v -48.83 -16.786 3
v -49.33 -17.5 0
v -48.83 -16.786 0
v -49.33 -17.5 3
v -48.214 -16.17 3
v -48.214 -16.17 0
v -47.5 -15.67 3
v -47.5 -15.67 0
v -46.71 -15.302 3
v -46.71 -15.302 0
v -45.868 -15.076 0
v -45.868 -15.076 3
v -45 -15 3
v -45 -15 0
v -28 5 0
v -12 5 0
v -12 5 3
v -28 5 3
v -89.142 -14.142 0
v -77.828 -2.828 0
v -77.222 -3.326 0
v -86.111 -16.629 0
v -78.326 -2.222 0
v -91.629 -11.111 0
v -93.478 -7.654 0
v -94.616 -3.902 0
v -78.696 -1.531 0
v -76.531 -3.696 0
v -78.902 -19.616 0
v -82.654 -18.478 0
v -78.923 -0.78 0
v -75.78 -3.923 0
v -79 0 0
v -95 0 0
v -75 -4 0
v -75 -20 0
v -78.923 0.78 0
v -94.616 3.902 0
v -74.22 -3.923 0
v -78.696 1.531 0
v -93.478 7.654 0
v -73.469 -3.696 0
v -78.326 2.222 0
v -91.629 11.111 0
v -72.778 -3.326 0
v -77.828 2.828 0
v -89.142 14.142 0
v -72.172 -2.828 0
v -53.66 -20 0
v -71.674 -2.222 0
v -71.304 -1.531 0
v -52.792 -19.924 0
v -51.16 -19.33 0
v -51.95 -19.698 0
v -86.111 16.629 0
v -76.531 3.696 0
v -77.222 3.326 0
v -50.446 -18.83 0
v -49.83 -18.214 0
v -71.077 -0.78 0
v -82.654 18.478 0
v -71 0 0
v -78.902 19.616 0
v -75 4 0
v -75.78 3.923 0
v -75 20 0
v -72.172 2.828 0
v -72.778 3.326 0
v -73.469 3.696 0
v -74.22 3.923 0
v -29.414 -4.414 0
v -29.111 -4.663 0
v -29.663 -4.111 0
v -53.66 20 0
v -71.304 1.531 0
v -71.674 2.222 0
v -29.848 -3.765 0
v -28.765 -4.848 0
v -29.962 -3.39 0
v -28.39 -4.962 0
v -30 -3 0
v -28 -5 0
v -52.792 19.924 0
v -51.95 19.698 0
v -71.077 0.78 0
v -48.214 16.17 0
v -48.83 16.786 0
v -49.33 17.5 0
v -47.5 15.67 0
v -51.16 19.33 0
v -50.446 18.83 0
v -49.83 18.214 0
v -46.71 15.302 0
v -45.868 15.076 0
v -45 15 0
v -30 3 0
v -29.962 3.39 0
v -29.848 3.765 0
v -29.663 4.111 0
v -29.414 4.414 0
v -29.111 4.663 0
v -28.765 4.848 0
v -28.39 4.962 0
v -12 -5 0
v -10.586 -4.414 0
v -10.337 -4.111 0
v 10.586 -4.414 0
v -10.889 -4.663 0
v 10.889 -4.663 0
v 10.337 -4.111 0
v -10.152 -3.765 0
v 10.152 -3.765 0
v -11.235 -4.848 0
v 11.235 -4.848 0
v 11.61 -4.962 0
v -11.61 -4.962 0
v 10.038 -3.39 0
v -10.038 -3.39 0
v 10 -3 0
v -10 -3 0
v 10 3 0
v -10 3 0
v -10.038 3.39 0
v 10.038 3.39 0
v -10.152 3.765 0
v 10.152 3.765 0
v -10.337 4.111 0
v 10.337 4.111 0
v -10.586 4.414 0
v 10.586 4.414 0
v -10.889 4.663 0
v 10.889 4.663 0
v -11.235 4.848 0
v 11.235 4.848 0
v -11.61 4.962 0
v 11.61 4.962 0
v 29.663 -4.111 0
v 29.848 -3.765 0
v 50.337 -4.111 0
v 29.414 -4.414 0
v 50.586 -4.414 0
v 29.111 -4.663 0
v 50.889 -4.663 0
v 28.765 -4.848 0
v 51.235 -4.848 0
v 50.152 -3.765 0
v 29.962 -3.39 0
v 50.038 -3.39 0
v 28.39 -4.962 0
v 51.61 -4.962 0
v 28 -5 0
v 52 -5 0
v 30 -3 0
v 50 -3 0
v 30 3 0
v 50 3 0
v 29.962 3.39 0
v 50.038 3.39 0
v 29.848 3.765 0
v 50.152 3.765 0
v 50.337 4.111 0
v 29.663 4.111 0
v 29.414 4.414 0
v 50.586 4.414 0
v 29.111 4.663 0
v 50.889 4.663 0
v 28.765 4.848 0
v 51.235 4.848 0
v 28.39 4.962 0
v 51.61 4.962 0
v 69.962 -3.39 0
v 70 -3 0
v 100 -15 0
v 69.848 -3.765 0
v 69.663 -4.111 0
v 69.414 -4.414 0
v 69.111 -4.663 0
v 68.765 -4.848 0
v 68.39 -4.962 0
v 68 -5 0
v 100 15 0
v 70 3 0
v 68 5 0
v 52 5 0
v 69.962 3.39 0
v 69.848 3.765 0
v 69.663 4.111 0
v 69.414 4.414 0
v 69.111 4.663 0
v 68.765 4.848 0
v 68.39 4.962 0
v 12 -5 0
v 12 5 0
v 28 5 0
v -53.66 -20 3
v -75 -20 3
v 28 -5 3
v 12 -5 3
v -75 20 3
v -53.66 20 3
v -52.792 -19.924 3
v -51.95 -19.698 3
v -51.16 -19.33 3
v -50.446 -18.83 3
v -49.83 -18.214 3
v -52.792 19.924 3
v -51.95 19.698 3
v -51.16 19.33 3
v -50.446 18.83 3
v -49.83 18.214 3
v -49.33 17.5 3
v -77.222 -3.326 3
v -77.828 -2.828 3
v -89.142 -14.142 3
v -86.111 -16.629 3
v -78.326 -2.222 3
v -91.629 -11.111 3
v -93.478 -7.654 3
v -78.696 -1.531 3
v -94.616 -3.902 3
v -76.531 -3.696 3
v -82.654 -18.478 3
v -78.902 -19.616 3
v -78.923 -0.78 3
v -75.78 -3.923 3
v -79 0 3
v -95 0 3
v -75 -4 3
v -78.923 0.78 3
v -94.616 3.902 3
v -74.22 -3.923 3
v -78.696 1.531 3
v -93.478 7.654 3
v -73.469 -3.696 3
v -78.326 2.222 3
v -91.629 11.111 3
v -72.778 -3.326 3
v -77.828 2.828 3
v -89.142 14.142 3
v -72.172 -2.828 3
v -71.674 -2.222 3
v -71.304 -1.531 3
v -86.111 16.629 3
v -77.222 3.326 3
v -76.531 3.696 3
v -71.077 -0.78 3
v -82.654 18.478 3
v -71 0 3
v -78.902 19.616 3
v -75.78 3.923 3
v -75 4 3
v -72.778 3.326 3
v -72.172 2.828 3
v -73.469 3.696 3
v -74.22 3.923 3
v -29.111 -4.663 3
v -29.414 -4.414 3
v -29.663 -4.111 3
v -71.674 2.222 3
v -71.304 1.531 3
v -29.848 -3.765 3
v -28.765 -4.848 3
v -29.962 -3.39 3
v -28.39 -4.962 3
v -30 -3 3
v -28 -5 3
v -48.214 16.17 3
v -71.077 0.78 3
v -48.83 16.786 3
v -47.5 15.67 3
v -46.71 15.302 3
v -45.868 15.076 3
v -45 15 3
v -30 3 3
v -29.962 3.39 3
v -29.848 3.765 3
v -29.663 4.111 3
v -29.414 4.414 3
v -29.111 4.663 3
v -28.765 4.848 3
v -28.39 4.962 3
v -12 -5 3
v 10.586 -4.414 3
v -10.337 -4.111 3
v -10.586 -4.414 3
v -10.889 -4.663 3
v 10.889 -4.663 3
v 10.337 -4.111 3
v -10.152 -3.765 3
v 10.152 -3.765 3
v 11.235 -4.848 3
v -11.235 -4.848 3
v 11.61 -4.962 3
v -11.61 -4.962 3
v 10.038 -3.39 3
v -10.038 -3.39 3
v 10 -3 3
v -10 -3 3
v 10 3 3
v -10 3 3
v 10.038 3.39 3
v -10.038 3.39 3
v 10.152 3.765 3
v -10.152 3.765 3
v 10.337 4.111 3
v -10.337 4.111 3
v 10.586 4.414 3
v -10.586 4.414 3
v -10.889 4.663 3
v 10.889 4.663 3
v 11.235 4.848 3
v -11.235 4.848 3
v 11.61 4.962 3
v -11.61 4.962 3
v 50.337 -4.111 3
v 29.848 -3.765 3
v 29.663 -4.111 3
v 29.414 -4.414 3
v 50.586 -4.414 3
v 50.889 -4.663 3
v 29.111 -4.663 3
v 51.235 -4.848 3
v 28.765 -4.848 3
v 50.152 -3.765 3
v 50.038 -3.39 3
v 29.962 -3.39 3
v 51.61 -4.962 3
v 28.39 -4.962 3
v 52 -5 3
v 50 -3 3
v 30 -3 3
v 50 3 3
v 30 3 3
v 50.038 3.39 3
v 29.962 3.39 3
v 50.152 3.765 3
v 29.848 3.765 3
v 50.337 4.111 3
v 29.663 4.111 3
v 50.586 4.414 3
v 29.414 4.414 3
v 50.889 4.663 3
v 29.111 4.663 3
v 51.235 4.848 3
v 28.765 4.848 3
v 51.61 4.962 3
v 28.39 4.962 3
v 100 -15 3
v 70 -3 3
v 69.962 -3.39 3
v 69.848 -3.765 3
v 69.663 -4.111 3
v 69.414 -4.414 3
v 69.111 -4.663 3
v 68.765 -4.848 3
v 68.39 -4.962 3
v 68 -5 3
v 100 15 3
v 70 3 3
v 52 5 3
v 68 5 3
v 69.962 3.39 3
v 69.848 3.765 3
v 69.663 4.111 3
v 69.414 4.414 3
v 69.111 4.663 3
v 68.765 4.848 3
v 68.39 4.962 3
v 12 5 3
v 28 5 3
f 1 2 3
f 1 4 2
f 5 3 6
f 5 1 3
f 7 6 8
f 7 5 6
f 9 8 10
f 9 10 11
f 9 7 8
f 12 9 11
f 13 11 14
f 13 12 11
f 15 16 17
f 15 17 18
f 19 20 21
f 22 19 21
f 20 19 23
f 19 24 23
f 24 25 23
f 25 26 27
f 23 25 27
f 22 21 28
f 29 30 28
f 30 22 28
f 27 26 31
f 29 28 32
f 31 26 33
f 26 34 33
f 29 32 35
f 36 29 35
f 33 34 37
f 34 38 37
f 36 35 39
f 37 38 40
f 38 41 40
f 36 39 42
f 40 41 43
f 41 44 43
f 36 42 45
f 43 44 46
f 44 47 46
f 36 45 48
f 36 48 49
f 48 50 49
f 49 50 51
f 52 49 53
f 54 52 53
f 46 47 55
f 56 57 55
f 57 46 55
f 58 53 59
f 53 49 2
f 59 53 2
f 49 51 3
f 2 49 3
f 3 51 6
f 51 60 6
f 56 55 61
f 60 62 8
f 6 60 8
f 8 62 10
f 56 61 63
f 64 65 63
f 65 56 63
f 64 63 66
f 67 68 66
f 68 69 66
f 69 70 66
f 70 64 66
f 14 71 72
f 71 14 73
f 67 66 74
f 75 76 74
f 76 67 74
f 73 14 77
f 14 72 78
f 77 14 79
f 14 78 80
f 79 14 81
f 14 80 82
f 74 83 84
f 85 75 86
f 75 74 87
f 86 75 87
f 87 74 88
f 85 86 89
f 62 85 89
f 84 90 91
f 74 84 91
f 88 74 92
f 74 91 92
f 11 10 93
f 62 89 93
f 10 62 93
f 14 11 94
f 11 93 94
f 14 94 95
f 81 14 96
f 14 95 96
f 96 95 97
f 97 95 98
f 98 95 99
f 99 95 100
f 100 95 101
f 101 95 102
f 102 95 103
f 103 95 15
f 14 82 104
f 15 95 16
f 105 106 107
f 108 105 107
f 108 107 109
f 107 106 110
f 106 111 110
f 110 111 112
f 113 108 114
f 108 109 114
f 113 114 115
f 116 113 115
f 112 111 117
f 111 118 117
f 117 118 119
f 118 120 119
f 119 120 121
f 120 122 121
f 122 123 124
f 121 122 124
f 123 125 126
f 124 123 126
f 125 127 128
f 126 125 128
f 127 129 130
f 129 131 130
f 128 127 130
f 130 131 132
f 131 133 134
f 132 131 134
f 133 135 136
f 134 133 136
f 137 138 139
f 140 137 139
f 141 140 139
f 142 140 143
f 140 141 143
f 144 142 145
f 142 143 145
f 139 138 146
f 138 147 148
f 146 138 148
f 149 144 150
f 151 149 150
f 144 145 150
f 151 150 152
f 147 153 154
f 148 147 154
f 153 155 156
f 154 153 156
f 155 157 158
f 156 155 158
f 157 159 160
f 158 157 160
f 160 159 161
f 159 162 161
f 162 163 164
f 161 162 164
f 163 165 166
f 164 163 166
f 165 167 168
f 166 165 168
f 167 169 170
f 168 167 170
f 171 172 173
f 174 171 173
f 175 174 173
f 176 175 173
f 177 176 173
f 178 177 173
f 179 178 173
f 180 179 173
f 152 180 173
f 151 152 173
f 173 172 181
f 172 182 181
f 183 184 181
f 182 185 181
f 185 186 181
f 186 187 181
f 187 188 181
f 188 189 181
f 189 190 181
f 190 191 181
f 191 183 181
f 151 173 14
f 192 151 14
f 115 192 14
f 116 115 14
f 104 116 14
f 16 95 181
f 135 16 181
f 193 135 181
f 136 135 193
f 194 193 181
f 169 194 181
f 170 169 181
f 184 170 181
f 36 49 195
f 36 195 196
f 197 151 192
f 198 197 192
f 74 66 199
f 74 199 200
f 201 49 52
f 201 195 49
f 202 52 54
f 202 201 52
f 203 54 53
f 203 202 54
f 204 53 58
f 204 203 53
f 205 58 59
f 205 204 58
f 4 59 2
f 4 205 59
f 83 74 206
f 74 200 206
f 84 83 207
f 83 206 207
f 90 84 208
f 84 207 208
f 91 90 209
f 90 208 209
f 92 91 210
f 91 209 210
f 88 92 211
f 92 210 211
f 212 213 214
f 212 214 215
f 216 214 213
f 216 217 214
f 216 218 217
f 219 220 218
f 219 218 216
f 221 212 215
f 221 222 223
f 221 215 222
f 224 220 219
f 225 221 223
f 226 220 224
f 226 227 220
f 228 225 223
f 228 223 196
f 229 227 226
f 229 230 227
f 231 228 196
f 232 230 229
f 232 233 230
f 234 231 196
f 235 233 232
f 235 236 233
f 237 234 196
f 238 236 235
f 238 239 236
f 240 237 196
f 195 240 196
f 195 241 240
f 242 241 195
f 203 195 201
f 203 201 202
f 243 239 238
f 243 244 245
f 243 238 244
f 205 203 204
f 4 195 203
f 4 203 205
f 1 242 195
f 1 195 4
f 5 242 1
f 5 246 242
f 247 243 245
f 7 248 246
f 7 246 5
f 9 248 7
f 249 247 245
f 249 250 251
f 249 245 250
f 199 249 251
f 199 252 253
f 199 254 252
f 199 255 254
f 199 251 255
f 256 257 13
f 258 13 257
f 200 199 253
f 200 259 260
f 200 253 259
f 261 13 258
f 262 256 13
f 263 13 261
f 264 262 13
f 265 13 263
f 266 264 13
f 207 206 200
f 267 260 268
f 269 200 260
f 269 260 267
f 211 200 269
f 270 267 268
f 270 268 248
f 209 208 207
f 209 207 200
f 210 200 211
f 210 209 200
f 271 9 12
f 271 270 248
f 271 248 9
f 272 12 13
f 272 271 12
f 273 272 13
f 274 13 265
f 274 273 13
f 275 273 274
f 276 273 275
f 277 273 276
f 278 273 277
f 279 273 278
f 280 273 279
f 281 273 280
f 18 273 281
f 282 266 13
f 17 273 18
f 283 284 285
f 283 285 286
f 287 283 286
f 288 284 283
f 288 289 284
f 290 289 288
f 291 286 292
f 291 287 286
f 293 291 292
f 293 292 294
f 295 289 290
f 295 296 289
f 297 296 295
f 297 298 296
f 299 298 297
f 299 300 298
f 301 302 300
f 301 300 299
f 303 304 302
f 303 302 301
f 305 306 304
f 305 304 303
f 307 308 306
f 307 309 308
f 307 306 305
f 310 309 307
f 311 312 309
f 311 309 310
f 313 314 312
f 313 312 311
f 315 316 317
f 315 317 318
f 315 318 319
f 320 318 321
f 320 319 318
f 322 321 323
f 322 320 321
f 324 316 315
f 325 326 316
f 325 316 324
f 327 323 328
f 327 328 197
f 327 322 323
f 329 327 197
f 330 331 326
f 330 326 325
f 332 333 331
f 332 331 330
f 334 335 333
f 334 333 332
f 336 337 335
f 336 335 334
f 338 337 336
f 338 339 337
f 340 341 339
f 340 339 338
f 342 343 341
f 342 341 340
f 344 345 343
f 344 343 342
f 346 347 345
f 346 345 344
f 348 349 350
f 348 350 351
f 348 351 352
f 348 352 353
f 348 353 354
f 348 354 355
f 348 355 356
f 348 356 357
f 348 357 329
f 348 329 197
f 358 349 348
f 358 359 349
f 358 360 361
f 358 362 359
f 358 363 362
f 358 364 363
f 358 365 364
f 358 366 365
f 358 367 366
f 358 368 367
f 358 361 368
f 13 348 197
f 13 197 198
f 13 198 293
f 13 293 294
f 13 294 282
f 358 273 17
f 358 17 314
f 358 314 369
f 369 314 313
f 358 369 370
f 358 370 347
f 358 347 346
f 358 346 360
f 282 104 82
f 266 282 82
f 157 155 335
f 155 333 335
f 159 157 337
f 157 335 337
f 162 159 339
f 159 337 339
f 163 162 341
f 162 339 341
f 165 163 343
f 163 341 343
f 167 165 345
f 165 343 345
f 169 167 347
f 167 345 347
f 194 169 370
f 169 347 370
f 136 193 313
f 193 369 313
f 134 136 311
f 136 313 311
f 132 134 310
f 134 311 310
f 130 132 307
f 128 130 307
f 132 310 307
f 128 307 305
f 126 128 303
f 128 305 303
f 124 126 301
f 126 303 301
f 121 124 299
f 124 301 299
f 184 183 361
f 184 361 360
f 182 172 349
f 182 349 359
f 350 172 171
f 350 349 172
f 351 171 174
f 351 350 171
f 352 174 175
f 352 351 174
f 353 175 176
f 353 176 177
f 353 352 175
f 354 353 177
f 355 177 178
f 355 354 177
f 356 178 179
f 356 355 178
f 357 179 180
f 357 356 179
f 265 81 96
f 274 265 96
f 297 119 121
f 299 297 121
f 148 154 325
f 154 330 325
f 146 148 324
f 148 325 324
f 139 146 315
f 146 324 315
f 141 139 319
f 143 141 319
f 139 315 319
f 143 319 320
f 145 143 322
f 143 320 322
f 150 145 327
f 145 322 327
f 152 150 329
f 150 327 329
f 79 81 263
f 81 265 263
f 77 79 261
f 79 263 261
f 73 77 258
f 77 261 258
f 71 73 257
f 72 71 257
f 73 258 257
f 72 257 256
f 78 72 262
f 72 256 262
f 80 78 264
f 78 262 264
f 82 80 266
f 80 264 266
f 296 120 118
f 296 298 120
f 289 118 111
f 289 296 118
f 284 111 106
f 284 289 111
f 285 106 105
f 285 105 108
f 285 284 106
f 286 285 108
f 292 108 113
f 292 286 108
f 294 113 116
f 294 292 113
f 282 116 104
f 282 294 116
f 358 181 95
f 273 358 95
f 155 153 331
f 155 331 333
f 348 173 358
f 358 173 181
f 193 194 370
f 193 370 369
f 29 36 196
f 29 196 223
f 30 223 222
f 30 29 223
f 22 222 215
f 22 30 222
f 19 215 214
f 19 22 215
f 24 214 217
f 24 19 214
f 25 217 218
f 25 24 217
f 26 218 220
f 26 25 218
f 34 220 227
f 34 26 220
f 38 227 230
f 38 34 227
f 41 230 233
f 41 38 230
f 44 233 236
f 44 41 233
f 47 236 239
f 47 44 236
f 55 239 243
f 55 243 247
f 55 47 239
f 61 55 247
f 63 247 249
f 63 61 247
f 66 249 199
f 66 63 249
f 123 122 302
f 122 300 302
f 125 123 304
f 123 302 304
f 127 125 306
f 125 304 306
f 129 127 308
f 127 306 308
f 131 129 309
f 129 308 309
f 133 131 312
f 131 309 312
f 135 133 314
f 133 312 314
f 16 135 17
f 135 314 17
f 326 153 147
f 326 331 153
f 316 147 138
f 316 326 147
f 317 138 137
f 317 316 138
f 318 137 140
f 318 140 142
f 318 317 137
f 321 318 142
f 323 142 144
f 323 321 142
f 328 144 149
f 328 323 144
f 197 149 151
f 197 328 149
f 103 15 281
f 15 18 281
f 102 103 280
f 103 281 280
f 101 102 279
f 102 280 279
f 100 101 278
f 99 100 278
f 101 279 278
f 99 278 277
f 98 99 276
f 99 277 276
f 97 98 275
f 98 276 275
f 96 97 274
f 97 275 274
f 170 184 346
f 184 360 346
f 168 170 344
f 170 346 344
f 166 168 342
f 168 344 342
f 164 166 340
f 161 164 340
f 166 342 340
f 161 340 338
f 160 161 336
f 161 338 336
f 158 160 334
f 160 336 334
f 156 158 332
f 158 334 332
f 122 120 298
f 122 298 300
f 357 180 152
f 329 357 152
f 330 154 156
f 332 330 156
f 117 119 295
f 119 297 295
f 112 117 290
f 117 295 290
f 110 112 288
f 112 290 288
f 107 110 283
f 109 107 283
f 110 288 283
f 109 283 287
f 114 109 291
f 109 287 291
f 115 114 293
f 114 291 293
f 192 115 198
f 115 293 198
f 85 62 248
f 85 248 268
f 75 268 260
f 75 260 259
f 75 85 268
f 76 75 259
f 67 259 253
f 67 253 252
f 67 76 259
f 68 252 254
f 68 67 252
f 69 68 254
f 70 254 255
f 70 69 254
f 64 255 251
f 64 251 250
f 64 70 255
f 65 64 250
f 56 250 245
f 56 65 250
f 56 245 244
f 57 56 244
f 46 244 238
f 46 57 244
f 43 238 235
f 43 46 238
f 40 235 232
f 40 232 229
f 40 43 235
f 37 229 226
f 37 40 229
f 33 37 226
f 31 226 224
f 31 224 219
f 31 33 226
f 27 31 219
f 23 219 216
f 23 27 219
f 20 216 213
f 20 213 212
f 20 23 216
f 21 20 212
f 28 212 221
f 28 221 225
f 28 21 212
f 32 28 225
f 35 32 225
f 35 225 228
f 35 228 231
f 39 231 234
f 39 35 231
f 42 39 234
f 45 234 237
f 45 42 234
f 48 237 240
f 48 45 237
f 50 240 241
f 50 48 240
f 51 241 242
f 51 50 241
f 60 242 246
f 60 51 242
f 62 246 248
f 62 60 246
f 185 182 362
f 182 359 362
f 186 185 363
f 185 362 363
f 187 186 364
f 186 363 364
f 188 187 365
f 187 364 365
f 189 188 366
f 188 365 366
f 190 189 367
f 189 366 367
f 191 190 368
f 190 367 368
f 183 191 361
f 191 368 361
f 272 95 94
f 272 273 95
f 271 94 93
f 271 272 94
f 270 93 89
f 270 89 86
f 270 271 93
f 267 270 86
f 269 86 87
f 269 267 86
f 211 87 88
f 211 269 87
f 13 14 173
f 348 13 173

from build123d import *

# Parameters (mm, degrees)
SKETCH1_R           = 4
BOSS_EXTRUDE1_DEPTH = 3
FILLET1_R           = 5
SKETCH2_W           = 20
SKETCH2_H           = 10
CUT_EXTRUDE1_DEPTH  = 3
FILLET2_R           = 2
CUT_EXTRUDE3_DEPTH  = 3
FILLET4_R           = 5


with BuildPart() as part:
    # Sketch1 → Boss-Extrude1 (new body)
    with BuildSketch(Plane.XY):
        Polygon((-50, -25), (-50, -15), (100, -15), (100, 15), (-50, 15), (-50, 25), (-100, 25), (-100, -25), align=None)
        with Locations((-75, 0)):
            Circle(SKETCH1_R, mode=Mode.SUBTRACT)
    extrude(amount=BOSS_EXTRUDE1_DEPTH)

    # Fillet1
    fillet1_edges = [part.edges().sort_by_distance(p)[0] for p in [
        (-50, -15, 1.5),
        (-50, 15, 1.5),
    ]]
    fillet(fillet1_edges, radius=FILLET1_R)
    fillet1_2_edges = [part.edges().sort_by_distance(p)[0] for p in [
        (-50, -25, 1.5),
        (-50, 25, 1.5),
    ]]
    fillet(fillet1_2_edges, radius=FILLET1_R - 0.0001)  # a hair under: the kernel refuses the full size

    # Sketch2 → Cut-Extrude1 (cut)
    with BuildSketch(Plane(origin=(0, 0, 0), x_dir=(-1, 0, 0), z_dir=(0, 0, -1))):
        with Locations((20, 0)):
            Rectangle(SKETCH2_W, SKETCH2_H)
        with Locations((-20, 0)):
            Rectangle(SKETCH2_W, SKETCH2_H)
        with Locations((-60, 0)):
            Rectangle(SKETCH2_W, SKETCH2_H)
    extrude(amount=-CUT_EXTRUDE1_DEPTH, mode=Mode.SUBTRACT)

    # Fillet2
    fillet2_edges = [part.edges().sort_by_distance(p)[0] for p in [
        (-30, -5, 1.5),
        (-10, -5, 1.5),
        (-10, 5, 1.5),
        (-30, 5, 1.5),
        (30, 5, 1.5),
        (10, 5, 1.5),
        (10, -5, 1.5),
        (30, -5, 1.5),
        (70, 5, 1.5),
        (50, 5, 1.5),
        (50, -5, 1.5),
        (70, -5, 1.5),
    ]]
    fillet(fillet2_edges, radius=FILLET2_R)

    # Sketch3 → Cut-Extrude3 (cut)
    with BuildSketch(Plane(origin=(0, 0, 0), x_dir=(-1, 0, 0), z_dir=(0, 0, -1))):
        with BuildLine():
            ThreePointArc((75, -20), (95, 0), (75, 20))
            Line((75, 20), (50, 20))
            ThreePointArc((50, 20), (51.464466094, 23.535533906), (55, 25))
            Line((55, 25), (100, 25))
            Line((100, 25), (100, -25))
            Line((100, -25), (55, -25))
            ThreePointArc((55, -25), (51.464466094, -23.535533906), (50, -20))
            Line((50, -20), (75, -20))
        make_face()
    extrude(amount=-CUT_EXTRUDE3_DEPTH, mode=Mode.SUBTRACT)


with BuildPart() as cut_extrude3_kept_piece:
    # of the separate pieces the step leaves, the one the design keeps (cut_extrude3_pieces_kept)
    add(part.part.solids().sort_by_distance((-50, -20, 0))[0])

    # Fillet4
    fillet4_edges = [cut_extrude3_kept_piece.edges().sort_by_distance(p)[0] for p in [
        (-50, -20, 1.5),
        (-50, 20, 1.5),
    ]]
    fillet(fillet4_edges, radius=FILLET4_R)


solid = cut_extrude3_kept_piece.part
